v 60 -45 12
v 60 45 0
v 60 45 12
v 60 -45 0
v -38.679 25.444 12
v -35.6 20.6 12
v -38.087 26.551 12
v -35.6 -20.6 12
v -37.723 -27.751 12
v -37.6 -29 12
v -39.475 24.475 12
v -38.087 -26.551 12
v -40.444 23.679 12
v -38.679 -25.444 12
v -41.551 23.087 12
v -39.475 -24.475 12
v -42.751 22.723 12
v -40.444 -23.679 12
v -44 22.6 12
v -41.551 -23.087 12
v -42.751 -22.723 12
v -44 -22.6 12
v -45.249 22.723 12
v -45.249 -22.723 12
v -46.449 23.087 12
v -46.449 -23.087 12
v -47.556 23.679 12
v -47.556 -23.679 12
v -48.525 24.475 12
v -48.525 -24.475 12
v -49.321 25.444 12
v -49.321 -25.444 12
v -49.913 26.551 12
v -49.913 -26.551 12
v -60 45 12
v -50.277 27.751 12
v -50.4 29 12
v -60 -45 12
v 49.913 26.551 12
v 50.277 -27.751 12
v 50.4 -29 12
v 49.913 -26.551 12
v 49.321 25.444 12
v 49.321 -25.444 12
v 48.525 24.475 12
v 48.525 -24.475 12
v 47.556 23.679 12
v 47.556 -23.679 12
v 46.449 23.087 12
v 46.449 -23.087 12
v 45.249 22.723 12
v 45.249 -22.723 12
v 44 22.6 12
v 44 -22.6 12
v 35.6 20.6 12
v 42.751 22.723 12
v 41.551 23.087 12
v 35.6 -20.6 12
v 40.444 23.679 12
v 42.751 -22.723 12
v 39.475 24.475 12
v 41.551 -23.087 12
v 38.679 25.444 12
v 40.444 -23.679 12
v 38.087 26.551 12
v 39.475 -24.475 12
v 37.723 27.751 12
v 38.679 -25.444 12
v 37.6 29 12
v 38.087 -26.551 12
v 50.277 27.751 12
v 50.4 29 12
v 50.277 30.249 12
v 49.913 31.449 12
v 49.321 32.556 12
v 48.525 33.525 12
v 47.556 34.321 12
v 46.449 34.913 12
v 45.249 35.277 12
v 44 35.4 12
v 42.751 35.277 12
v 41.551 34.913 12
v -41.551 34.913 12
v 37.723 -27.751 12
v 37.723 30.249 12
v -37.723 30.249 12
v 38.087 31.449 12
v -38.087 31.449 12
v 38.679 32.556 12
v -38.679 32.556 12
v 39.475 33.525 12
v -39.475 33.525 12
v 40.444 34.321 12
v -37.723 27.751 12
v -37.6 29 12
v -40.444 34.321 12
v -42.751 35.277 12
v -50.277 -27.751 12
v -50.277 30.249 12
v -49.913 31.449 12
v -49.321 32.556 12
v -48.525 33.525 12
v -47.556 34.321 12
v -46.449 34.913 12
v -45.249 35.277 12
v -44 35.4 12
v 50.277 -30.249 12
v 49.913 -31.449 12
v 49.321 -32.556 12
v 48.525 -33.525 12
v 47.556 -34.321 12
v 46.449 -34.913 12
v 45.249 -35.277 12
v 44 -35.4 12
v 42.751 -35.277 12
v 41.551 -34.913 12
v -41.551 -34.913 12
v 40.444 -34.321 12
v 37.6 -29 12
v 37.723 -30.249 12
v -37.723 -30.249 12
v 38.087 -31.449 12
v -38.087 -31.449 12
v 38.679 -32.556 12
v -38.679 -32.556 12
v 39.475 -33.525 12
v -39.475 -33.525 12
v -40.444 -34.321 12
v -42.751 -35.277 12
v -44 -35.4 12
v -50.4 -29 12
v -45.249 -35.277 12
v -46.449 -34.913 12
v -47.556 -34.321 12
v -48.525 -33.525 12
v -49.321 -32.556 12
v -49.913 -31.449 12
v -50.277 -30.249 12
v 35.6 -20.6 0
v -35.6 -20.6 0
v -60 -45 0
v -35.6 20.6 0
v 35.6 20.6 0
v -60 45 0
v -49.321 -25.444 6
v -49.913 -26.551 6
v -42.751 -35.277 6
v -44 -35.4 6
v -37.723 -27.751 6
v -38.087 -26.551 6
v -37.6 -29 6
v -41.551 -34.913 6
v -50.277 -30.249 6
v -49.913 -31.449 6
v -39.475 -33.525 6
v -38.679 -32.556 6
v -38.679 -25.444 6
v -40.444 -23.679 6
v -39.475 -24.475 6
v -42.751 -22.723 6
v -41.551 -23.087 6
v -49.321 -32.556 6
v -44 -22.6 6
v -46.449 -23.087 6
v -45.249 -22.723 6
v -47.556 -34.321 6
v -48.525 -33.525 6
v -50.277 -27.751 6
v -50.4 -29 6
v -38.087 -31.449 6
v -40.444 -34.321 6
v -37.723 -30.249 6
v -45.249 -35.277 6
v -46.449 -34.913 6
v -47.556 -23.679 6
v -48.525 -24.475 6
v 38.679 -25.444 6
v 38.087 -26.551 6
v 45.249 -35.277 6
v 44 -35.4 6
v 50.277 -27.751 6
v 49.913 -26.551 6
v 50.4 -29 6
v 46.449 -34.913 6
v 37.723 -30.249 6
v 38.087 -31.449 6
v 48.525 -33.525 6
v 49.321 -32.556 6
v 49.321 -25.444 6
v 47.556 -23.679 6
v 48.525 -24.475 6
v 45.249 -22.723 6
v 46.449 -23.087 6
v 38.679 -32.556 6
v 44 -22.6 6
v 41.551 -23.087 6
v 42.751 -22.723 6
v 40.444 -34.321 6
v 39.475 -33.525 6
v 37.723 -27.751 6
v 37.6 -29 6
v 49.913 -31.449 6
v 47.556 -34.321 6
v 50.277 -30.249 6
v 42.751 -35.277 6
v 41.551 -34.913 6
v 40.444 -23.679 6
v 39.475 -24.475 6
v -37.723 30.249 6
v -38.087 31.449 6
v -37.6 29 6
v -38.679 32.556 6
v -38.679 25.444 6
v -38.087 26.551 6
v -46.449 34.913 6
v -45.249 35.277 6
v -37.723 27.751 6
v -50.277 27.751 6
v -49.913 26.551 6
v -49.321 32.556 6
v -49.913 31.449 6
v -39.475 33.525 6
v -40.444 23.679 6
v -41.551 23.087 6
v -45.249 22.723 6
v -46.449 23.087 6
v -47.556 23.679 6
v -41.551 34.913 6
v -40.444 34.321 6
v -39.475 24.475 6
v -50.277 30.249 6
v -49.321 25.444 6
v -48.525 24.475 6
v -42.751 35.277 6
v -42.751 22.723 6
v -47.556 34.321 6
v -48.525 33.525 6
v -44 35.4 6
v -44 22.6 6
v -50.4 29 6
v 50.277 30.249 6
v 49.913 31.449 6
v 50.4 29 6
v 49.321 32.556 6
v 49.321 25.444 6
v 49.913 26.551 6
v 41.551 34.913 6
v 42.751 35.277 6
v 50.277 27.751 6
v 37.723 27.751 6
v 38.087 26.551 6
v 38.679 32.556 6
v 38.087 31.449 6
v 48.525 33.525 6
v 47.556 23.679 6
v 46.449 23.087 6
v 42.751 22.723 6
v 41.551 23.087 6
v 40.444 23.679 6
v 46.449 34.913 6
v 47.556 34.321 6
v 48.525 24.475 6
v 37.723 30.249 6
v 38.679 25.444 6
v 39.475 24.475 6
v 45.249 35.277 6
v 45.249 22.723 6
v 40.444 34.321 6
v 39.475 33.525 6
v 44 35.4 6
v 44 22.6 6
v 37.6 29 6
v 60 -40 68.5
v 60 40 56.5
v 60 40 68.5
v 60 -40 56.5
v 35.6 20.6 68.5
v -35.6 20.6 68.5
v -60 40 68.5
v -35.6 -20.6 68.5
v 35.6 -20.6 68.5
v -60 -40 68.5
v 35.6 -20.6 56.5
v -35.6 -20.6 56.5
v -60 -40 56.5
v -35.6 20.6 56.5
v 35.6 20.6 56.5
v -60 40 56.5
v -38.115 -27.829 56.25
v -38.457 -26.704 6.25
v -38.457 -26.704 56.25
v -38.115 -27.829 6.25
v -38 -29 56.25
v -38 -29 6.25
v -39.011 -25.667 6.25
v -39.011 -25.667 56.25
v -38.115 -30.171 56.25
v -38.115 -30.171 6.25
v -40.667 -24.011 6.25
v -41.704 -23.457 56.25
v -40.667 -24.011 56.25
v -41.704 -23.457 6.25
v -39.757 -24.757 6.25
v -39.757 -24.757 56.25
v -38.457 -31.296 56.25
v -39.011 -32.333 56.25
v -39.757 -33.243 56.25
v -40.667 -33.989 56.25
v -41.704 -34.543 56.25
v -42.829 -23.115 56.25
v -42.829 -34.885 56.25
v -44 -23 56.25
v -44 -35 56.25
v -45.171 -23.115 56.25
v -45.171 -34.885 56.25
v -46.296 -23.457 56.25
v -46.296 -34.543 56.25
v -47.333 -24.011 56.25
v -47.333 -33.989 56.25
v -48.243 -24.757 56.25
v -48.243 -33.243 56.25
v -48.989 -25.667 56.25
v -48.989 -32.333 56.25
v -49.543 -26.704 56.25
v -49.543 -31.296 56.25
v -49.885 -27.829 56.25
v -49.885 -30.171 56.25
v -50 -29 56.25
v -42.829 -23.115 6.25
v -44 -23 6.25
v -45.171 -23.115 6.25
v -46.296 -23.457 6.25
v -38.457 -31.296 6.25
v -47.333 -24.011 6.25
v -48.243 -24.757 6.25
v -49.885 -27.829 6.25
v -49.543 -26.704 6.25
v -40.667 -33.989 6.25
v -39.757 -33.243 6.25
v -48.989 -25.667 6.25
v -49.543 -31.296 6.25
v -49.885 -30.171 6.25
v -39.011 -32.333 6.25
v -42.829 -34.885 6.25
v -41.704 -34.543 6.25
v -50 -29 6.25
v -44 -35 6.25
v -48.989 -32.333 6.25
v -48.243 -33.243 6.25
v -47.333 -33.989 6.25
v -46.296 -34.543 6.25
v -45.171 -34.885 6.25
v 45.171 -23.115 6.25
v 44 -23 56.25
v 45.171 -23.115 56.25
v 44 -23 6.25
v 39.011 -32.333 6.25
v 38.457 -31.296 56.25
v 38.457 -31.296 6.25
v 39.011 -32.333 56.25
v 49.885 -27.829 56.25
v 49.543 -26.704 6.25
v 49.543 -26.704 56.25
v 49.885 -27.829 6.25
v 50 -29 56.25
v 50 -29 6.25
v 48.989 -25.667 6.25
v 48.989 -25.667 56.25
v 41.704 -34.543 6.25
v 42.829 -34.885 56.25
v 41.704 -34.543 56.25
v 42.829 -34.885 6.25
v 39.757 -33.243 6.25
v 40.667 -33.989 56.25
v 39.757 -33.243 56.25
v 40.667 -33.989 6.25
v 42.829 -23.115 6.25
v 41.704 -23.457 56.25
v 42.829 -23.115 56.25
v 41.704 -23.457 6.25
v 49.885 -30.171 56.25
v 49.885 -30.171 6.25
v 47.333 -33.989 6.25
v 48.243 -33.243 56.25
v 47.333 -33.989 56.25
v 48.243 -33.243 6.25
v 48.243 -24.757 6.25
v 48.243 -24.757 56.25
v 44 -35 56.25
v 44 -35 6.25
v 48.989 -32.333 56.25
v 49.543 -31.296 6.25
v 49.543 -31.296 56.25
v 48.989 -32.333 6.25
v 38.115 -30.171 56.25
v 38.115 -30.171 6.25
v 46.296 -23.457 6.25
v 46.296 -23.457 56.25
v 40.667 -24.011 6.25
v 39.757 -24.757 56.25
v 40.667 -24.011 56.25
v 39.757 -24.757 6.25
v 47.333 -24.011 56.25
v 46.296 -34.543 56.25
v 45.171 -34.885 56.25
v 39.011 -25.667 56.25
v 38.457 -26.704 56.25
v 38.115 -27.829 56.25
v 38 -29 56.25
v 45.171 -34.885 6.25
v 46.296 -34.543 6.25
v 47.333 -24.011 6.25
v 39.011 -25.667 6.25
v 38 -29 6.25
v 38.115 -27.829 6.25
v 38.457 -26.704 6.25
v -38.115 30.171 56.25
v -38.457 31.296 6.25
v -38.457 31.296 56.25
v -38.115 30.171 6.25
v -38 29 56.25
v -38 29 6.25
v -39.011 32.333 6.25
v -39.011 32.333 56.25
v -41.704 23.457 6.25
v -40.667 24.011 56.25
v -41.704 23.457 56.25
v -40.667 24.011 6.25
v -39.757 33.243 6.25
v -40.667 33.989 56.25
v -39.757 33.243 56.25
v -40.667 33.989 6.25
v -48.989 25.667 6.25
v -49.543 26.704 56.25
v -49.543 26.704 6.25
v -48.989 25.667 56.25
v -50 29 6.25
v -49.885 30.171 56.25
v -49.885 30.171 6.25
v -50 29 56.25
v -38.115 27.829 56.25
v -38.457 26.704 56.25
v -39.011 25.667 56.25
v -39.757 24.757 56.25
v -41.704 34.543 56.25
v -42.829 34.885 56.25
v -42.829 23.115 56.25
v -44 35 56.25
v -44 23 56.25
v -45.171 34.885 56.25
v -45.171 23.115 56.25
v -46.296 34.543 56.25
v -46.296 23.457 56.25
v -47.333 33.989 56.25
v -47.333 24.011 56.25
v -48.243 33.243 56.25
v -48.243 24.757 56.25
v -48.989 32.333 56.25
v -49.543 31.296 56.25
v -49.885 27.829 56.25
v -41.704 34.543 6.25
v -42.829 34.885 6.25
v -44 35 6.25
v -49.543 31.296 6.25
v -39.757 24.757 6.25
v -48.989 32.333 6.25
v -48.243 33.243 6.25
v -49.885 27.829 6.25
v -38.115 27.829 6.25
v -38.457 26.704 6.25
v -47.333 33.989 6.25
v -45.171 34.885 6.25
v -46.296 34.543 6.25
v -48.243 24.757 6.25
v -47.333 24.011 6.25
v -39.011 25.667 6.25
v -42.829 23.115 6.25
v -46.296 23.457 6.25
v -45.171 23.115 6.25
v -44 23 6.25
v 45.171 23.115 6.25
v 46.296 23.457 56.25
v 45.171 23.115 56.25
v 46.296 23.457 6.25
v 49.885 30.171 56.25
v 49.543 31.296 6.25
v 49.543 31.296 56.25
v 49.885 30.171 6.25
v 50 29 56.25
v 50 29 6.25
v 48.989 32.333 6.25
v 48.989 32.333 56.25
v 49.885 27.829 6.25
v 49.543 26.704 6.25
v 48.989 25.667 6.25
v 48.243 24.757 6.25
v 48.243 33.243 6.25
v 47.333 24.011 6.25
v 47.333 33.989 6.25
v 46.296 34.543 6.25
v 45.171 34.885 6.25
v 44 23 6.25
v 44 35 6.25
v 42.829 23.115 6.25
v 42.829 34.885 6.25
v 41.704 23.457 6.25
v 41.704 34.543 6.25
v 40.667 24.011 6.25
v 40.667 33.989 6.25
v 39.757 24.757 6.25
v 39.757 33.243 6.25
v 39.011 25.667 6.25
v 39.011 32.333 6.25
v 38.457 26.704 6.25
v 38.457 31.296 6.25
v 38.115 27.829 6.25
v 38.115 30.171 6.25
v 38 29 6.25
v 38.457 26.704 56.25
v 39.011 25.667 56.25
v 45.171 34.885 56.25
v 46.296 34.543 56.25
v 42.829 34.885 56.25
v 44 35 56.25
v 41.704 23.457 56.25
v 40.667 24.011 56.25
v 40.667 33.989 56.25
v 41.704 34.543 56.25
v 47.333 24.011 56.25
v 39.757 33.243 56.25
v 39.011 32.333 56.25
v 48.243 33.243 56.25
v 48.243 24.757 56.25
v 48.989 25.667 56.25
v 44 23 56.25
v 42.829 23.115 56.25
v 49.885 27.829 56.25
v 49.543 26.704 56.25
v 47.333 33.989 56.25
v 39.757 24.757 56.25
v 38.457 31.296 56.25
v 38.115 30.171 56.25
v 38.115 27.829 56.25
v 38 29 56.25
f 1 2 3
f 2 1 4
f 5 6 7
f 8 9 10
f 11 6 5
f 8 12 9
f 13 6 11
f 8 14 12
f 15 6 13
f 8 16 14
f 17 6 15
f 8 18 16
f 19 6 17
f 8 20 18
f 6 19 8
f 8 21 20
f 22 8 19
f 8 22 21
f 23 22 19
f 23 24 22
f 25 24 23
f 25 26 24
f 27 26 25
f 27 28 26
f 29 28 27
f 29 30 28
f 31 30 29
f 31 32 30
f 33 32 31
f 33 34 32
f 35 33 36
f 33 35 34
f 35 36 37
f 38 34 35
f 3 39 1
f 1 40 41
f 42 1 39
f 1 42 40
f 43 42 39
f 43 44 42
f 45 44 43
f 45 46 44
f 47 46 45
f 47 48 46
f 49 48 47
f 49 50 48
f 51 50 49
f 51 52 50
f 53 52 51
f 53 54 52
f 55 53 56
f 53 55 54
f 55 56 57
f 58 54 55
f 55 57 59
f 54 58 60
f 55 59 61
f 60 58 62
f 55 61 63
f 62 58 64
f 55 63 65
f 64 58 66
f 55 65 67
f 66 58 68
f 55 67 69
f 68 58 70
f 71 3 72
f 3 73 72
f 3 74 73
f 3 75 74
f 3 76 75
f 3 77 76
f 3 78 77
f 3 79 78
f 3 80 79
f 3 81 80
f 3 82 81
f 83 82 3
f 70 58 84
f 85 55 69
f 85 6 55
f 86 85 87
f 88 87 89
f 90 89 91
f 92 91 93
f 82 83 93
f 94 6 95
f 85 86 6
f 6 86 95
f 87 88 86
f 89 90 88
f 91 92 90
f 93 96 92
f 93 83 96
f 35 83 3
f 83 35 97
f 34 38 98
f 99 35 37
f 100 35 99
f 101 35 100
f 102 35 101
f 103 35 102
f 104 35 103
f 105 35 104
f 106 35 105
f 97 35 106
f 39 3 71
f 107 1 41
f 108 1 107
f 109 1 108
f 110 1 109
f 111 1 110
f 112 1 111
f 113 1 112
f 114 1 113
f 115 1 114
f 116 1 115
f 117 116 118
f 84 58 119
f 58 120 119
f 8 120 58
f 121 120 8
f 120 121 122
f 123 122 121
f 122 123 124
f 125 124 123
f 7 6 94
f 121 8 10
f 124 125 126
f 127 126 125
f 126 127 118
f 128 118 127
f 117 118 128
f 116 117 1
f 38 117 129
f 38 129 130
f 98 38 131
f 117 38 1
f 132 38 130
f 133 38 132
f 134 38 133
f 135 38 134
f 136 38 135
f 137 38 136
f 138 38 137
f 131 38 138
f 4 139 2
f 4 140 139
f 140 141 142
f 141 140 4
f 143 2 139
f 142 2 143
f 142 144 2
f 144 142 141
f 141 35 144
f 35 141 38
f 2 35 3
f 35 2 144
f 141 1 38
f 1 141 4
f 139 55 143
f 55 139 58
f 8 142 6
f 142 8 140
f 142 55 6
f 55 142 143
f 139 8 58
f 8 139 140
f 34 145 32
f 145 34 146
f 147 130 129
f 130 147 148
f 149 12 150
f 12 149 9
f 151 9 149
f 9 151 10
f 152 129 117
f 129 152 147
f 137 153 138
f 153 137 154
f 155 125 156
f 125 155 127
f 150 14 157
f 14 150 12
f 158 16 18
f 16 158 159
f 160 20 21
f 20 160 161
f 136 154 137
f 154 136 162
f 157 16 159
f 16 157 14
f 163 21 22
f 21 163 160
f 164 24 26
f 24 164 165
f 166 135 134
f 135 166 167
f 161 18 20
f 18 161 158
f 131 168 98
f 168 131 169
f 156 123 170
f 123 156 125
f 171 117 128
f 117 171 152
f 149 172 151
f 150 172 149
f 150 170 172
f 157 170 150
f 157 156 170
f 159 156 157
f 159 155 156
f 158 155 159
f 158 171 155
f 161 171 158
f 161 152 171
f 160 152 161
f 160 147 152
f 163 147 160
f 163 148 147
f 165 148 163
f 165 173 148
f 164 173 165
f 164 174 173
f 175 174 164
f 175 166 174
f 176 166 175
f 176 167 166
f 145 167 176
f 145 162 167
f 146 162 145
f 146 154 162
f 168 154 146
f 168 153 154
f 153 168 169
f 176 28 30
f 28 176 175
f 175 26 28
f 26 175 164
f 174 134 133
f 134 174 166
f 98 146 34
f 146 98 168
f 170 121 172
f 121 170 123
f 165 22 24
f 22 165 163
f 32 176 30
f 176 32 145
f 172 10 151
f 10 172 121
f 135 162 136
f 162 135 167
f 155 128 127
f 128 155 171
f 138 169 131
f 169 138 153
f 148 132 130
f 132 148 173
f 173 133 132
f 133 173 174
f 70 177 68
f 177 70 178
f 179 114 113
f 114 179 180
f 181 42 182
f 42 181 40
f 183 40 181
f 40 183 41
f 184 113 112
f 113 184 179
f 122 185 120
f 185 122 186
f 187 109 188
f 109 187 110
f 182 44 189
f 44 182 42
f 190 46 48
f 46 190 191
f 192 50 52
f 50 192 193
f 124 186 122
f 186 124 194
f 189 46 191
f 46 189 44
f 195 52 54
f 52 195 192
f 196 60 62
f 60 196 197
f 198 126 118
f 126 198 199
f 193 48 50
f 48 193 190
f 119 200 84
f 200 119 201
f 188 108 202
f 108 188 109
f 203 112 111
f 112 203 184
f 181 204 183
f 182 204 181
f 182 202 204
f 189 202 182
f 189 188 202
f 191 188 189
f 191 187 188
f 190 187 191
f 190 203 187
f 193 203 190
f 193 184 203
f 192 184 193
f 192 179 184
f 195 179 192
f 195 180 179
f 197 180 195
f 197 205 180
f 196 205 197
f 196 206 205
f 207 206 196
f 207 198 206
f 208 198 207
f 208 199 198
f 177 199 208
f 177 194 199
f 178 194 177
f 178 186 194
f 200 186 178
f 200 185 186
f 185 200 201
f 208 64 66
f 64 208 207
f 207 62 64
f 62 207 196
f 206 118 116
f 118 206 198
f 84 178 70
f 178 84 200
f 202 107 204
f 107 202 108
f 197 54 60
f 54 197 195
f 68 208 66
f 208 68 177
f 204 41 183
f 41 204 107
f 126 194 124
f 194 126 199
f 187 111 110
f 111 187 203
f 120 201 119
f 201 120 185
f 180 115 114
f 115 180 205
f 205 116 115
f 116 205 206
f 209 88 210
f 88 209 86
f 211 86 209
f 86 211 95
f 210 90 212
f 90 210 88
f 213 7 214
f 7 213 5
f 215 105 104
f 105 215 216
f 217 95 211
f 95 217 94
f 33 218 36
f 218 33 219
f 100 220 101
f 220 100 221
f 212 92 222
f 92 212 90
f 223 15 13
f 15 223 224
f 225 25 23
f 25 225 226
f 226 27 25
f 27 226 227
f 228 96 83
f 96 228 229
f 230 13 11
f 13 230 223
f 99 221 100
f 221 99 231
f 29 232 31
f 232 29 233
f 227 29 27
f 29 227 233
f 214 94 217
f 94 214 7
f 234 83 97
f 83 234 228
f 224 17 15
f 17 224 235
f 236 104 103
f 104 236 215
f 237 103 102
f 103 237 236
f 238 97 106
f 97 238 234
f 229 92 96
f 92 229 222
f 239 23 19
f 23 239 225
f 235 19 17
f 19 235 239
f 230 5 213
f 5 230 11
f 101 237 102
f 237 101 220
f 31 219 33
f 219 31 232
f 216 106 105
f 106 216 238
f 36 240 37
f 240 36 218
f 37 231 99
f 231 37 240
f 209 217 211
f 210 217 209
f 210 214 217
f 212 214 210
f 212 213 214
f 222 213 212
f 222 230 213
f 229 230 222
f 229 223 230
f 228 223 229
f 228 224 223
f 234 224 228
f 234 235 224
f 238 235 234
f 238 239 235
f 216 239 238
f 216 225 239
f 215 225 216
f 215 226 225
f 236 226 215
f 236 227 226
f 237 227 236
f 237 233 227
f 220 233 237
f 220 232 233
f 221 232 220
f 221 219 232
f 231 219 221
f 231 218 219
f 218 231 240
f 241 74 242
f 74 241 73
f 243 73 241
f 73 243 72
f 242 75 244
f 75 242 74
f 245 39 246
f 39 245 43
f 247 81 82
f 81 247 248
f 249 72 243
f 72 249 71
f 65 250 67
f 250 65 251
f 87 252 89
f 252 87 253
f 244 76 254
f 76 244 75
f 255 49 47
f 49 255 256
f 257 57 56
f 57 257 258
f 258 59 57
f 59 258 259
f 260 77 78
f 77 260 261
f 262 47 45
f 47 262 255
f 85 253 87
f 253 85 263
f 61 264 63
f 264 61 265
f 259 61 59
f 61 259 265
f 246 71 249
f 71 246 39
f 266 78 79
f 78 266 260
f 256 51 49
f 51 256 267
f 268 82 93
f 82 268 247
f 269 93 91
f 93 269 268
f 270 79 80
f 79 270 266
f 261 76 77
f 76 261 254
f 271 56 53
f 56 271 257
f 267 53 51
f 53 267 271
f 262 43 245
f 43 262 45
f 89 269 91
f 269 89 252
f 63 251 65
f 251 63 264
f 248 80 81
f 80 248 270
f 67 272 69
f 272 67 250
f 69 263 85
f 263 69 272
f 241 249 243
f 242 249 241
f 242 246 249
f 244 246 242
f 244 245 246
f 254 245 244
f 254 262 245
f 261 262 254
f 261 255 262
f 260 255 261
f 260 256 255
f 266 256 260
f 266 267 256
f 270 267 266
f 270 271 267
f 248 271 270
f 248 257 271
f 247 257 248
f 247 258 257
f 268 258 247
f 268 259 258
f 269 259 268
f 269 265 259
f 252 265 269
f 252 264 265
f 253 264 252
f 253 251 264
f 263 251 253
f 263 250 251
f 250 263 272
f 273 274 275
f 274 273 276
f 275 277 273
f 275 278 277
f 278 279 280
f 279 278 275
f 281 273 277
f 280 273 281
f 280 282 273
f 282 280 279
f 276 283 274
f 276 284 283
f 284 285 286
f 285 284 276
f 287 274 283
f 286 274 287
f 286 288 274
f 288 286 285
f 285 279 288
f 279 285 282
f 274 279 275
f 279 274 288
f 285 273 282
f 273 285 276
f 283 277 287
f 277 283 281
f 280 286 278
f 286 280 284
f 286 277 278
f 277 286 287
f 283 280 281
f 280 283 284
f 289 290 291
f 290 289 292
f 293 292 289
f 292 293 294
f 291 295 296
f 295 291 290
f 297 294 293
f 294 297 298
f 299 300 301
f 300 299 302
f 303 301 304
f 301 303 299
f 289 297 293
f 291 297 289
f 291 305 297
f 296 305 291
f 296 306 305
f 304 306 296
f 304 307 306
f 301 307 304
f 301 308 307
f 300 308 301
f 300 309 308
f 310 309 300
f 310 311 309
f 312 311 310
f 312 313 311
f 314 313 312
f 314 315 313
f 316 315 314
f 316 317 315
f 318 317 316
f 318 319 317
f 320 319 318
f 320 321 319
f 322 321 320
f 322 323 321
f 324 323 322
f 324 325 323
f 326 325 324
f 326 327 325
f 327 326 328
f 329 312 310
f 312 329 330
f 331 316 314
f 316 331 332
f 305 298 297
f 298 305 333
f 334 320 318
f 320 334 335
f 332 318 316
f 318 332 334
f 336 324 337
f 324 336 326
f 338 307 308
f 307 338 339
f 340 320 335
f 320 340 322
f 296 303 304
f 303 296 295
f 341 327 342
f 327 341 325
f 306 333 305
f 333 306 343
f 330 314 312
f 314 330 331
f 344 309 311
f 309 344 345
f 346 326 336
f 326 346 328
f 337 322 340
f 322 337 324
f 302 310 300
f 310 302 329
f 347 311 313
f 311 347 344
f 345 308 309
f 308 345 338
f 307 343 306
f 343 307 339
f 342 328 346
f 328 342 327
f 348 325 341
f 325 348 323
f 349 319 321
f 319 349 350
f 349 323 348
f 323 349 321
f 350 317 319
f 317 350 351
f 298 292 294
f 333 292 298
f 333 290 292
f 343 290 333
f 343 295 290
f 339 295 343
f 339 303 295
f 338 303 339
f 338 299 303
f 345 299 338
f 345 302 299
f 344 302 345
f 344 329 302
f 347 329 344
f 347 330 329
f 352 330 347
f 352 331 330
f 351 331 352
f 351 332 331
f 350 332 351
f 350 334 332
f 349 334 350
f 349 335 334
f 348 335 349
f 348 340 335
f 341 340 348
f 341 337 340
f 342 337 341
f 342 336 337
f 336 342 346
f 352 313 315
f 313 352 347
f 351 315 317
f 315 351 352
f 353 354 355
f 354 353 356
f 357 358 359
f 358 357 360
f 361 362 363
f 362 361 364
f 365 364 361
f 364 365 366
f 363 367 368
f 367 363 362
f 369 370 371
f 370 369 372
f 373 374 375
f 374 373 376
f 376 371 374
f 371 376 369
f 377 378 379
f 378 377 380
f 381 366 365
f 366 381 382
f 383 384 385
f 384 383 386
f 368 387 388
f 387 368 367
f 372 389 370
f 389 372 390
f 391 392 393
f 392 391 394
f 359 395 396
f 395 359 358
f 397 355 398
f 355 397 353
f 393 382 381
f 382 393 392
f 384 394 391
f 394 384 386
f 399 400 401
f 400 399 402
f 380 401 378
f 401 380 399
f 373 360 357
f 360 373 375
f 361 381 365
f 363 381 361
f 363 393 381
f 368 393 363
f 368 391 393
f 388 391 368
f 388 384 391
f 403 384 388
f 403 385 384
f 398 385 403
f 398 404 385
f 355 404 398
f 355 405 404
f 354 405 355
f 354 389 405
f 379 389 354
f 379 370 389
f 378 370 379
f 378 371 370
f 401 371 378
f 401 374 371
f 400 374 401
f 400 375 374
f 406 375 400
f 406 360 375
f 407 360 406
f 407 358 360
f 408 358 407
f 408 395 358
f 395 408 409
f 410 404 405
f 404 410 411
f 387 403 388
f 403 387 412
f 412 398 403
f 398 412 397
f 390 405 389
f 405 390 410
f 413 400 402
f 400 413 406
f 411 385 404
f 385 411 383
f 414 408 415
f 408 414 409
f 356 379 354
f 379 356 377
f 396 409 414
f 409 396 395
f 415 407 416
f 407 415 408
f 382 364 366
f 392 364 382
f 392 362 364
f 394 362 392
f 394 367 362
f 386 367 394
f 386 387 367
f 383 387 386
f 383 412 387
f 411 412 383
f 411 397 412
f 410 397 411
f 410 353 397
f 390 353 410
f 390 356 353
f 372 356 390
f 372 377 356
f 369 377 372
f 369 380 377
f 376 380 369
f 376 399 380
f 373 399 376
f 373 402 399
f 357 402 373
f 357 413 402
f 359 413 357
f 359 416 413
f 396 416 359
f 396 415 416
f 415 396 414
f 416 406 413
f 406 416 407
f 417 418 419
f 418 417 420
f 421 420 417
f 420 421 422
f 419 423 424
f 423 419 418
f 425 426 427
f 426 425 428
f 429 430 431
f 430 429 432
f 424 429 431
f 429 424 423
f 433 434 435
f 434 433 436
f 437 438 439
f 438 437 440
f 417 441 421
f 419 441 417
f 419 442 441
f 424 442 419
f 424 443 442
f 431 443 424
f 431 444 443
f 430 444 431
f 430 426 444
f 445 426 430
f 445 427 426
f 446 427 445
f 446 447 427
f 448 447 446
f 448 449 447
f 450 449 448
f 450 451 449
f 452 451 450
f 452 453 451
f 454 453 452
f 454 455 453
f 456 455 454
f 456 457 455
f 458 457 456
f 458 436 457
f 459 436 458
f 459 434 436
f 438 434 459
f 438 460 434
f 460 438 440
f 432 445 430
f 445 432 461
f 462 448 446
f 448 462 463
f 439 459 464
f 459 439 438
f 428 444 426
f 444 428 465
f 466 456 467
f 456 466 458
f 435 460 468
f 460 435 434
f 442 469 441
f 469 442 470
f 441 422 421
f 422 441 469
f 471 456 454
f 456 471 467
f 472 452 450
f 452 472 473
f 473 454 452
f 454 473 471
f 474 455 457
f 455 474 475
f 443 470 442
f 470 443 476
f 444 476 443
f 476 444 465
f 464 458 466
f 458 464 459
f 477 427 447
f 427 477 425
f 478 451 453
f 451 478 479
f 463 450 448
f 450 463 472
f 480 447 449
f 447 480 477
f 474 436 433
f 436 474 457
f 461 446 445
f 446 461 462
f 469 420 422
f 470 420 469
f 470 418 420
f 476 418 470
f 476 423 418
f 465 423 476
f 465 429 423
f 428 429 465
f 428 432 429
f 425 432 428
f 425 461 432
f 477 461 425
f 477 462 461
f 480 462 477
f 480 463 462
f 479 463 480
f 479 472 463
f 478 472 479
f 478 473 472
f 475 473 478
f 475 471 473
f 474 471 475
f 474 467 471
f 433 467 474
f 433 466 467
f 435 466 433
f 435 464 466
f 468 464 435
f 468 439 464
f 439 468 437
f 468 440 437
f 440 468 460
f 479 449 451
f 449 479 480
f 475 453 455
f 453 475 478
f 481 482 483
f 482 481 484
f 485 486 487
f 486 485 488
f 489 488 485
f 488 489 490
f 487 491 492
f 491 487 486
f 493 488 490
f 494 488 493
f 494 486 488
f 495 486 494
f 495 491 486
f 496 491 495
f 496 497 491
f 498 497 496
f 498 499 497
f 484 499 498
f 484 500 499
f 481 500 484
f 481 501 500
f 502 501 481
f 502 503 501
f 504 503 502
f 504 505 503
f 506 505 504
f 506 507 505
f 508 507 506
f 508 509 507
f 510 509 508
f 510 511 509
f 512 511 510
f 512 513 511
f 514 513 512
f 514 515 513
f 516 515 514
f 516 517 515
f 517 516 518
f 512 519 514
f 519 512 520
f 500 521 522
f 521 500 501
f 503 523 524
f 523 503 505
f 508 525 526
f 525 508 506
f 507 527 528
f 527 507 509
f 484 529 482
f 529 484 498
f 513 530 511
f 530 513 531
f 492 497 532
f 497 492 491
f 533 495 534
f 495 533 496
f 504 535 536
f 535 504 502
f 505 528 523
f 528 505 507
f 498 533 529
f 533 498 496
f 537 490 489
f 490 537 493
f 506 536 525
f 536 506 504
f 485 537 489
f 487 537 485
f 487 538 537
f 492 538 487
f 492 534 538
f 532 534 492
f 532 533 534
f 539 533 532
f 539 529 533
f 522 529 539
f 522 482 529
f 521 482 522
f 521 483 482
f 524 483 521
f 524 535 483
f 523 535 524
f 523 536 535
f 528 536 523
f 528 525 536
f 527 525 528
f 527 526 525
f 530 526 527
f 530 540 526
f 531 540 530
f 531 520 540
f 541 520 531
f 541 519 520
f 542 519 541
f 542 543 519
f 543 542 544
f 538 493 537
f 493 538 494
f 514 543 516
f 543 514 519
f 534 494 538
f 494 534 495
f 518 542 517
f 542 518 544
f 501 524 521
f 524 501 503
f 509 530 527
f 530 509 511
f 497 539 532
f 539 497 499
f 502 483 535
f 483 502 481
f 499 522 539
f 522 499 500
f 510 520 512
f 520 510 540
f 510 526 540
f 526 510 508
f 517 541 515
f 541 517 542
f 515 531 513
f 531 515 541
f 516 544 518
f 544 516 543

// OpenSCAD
$fn = 32;

// ------------------------------------------------------------------------
// Frame cube: base 120 x 90 mm, posts 50 mm tall
// Every part is its own module, assembly() places every instance.
// ------------------------------------------------------------------------

// --- part 1 ---
module base_frame() {
  difference() {
    translate([-60, -45, 0]) cube([120, 90, 12]);
    translate([-35.6, -20.6, -1]) cube([71.2, 41.2, 14]);
    translate([-44, -29, 6]) cylinder(h = 7, d = 12.8);
    translate([44, -29, 6]) cylinder(h = 7, d = 12.8);
    translate([-44, 29, 6]) cylinder(h = 7, d = 12.8);
    translate([44, 29, 6]) cylinder(h = 7, d = 12.8);
  }
}

// --- part 2 ---
module corner_post() {
  cylinder(h = 50, d = 12);
}

// --- part 3 ---
module top_frame() {
  difference() {
    translate([-60, -40, 0]) cube([120, 80, 12]);
    translate([-35.6, -20.6, -1]) cube([71.2, 41.2, 14]);
  }
}

// --- assembly ---
module assembly() {
  color([0.80, 0.24, 0.20]) translate([0, 0, 0]) rotate([0, 0, 0]) base_frame();
  color([0.20, 0.45, 0.75]) translate([-44, -29, 6.25]) rotate([0, 0, 0]) corner_post();
  color([0.25, 0.62, 0.32]) translate([44, -29, 6.25]) rotate([0, 0, 0]) corner_post();
  color([0.92, 0.70, 0.18]) translate([-44, 29, 6.25]) rotate([0, 0, 0]) corner_post();
  color([0.58, 0.35, 0.70]) translate([44, 29, 6.25]) rotate([0, 0, 0]) corner_post();
  color([0.16, 0.66, 0.66]) translate([0, 0, 56.5]) rotate([0, 0, 0]) top_frame();
}

assembly();
